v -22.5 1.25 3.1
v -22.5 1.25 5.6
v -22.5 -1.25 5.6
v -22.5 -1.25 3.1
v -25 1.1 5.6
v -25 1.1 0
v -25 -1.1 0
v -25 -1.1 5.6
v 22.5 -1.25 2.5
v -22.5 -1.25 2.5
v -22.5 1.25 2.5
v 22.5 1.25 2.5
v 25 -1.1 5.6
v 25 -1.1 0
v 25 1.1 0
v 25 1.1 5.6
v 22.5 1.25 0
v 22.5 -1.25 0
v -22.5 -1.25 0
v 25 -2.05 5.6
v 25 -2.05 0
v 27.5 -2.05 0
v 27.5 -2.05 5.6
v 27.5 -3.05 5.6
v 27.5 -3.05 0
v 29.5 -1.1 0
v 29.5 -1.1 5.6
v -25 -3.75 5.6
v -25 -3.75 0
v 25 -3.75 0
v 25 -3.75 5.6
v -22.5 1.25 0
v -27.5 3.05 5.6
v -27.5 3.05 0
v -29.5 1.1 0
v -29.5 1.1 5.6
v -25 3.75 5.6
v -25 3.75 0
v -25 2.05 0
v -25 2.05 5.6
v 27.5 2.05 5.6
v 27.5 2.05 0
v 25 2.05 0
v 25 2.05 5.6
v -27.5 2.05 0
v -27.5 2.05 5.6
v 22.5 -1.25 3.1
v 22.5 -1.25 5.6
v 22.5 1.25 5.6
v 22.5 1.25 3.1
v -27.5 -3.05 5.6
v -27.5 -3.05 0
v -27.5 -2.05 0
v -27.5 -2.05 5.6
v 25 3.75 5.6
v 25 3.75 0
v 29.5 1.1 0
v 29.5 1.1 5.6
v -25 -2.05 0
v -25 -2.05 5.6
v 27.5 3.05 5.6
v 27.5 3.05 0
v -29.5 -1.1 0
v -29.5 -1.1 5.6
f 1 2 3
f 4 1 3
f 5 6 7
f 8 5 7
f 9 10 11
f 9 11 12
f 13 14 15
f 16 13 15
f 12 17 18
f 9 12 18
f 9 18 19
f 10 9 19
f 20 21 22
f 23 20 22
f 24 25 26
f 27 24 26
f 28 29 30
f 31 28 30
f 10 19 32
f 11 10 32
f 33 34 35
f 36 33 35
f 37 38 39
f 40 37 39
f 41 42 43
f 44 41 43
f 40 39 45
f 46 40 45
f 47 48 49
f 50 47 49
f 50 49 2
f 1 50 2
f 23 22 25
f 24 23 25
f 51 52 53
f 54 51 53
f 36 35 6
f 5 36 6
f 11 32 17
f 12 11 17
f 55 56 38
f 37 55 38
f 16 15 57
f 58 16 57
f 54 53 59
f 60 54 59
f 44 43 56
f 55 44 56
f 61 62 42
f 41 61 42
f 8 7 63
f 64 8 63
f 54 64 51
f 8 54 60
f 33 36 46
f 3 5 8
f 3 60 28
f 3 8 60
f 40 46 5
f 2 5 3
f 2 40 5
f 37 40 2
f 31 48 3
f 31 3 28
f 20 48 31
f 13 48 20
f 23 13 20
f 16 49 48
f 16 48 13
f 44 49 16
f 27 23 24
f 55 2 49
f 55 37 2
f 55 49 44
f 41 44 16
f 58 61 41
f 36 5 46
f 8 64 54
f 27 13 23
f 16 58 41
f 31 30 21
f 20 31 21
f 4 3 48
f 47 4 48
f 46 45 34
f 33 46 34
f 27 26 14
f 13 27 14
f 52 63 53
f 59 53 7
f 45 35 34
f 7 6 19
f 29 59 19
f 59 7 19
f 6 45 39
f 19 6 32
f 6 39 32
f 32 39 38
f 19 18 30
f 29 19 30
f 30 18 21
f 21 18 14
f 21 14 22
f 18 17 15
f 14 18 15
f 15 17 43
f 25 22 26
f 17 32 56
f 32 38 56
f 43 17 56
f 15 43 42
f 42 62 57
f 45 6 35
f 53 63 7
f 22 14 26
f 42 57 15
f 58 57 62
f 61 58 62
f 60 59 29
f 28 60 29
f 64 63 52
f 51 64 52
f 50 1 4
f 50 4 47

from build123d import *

# Parameters (mm, degrees)
F1_DEPTH = 5.6
F3_DEPTH = 2.5
F5_DEPTH = 2.5


with BuildPart() as f1:
    # F0 (on Top) → F1 (new body)
    with BuildSketch(Plane.XY):
        Polygon((25, 3.75), (0, 3.75), (-25, 3.75), (-25, 2.05), (-27.5, 2.05), (-27.5, 3.05), (-29.5, 1.1), (-25, 1.1), (-25, -1.1), (-29.5, -1.1), (-27.5, -3.05), (-27.5, -2.05), (-25, -2.05), (-25, -3.75), (0, -3.75), (25, -3.75), (25, -2.05), (27.5, -2.05), (27.5, -3.05), (29.5, -1.1), (25, -1.1), (25, 1.1), (29.5, 1.1), (27.5, 3.05), (27.5, 2.05), (25, 2.05), align=None)
    extrude(amount=F1_DEPTH)

    # F2 (on face) → F3 (cut)
    with BuildSketch(Plane.XY.offset(5.6)):
        Polygon((22.5, -1.25), (22.5, 1), (22.5, 1.25), (-22.5, 1.25), (-22.5, -1), (-22.5, -1.25), align=None)
    extrude(amount=-F3_DEPTH, mode=Mode.SUBTRACT)

    # F4 (on face) → F5 (cut)
    with BuildSketch(Plane(origin=(0, 0, 0), x_dir=(1, 0, 0), z_dir=(0, 0, -1))):
        Polygon((-22.5, 1.25), (-22.5, 0.4), (-22.5, -1.25), (22.5, -1.25), (22.5, -0.4), (22.5, 1.25), align=None)
    extrude(amount=-F5_DEPTH, mode=Mode.SUBTRACT)


solid = f1.part
